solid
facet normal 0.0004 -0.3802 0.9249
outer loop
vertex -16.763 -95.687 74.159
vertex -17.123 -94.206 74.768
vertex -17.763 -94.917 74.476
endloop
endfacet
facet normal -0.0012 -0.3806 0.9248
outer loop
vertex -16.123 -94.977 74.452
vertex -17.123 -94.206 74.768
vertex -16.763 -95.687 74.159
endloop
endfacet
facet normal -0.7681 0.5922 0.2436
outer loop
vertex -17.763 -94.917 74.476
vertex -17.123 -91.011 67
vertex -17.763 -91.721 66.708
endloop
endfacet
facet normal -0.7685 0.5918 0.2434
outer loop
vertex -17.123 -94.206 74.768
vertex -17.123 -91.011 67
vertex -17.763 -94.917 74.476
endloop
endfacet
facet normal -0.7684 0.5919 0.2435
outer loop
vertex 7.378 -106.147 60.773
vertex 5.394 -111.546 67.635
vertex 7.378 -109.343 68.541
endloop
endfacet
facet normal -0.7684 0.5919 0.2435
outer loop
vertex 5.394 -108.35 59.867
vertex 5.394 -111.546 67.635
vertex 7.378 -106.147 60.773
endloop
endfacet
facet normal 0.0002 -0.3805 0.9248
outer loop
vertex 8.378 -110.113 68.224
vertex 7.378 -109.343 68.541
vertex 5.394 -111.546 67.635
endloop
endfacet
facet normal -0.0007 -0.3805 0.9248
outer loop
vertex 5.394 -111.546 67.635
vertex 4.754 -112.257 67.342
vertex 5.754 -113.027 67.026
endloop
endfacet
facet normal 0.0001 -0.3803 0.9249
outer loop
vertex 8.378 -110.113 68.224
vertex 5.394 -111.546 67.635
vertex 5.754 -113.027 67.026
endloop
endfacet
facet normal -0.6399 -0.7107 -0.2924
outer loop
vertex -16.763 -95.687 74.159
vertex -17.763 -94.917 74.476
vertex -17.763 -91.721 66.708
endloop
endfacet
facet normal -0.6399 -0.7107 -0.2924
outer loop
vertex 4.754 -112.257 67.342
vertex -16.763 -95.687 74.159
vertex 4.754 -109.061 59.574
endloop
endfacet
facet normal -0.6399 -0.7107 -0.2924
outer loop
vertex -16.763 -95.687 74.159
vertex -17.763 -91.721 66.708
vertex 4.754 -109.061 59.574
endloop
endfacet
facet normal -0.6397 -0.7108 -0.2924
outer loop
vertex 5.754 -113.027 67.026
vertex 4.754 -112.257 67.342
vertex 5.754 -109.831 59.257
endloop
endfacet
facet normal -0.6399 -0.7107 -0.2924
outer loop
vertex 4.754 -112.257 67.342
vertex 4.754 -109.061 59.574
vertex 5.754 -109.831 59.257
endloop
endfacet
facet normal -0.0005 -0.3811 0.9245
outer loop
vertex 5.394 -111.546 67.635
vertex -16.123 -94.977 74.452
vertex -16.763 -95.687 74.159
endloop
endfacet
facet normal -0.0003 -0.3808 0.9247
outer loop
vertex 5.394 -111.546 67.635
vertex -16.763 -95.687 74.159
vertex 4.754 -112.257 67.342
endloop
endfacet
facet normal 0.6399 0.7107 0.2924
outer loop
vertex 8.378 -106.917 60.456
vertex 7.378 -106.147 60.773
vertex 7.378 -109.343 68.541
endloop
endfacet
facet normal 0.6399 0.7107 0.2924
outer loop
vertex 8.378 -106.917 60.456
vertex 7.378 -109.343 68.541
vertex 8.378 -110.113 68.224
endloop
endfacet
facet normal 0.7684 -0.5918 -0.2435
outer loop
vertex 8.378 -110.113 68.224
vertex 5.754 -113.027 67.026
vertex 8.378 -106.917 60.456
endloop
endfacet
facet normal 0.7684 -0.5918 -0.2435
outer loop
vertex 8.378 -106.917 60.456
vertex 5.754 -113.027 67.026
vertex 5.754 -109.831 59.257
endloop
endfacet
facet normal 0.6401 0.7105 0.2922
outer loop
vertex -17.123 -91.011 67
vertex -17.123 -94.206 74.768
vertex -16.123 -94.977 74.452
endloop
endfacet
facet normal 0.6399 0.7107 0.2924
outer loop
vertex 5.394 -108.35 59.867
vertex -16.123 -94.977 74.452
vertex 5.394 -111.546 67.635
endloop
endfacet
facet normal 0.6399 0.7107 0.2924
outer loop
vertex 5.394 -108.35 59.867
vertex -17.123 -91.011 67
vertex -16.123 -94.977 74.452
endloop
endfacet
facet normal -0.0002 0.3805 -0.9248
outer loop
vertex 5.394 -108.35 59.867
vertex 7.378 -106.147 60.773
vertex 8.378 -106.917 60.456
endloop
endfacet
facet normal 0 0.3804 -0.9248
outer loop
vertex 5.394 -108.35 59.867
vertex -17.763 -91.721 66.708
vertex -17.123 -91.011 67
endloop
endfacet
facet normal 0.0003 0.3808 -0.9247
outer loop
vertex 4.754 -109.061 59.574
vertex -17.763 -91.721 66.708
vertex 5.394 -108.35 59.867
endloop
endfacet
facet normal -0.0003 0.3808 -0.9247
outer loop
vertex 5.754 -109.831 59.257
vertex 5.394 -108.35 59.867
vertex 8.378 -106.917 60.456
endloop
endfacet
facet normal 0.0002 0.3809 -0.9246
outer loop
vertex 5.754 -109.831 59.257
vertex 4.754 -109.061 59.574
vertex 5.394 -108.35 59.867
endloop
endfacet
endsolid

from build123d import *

# Parameters (mm, degrees)
SALIENTE_EXTRUIR1_START = 3.1
SALIENTE_EXTRUIR1_DEPTH = 1
SALIENTE_EXTRUIR2_START = -1
CROQUIS4_W              = 1.301297423
CROQUIS4_H              = 8.40000117
SALIENTE_EXTRUIR2_DEPTH = 4.1


with BuildPart() as part:
    # Croquis3 → Saliente-Extruir1 (new body)
    with BuildSketch(Plane(origin=(-33.880247059, -37.627827516, -15.480136045), x_dir=(-0.768464217, 0.591770514, 0.243455141), z_dir=(-0.639892762, -0.710672931, -0.292371747)).offset(SALIENTE_EXTRUIR1_START)):
        Polygon((-24.387334523, -104.987555147), (-25.688631315, -104.987555147), (-53.688631947, -104.987557356), (-53.688631947, -96.587556289), (-25.688631947, -96.587556289), (-24.387335186, -96.587556289), align=None)
    extrude(amount=SALIENTE_EXTRUIR1_DEPTH)

    # Croquis4 → Saliente-Extruir2 (add)
    with BuildSketch(Plane(origin=(-35.863914621, -39.830913602, -16.38648846), x_dir=(0.768464217, -0.591770514, -0.243455141), z_dir=(0.639892762, 0.710672931, 0.292371747)).offset(SALIENTE_EXTRUIR2_START)):
        with Locations((54.339280659, -100.787556874)):
            Rectangle(CROQUIS4_W, CROQUIS4_H)
    extrude(amount=SALIENTE_EXTRUIR2_DEPTH)


solid = part.part
